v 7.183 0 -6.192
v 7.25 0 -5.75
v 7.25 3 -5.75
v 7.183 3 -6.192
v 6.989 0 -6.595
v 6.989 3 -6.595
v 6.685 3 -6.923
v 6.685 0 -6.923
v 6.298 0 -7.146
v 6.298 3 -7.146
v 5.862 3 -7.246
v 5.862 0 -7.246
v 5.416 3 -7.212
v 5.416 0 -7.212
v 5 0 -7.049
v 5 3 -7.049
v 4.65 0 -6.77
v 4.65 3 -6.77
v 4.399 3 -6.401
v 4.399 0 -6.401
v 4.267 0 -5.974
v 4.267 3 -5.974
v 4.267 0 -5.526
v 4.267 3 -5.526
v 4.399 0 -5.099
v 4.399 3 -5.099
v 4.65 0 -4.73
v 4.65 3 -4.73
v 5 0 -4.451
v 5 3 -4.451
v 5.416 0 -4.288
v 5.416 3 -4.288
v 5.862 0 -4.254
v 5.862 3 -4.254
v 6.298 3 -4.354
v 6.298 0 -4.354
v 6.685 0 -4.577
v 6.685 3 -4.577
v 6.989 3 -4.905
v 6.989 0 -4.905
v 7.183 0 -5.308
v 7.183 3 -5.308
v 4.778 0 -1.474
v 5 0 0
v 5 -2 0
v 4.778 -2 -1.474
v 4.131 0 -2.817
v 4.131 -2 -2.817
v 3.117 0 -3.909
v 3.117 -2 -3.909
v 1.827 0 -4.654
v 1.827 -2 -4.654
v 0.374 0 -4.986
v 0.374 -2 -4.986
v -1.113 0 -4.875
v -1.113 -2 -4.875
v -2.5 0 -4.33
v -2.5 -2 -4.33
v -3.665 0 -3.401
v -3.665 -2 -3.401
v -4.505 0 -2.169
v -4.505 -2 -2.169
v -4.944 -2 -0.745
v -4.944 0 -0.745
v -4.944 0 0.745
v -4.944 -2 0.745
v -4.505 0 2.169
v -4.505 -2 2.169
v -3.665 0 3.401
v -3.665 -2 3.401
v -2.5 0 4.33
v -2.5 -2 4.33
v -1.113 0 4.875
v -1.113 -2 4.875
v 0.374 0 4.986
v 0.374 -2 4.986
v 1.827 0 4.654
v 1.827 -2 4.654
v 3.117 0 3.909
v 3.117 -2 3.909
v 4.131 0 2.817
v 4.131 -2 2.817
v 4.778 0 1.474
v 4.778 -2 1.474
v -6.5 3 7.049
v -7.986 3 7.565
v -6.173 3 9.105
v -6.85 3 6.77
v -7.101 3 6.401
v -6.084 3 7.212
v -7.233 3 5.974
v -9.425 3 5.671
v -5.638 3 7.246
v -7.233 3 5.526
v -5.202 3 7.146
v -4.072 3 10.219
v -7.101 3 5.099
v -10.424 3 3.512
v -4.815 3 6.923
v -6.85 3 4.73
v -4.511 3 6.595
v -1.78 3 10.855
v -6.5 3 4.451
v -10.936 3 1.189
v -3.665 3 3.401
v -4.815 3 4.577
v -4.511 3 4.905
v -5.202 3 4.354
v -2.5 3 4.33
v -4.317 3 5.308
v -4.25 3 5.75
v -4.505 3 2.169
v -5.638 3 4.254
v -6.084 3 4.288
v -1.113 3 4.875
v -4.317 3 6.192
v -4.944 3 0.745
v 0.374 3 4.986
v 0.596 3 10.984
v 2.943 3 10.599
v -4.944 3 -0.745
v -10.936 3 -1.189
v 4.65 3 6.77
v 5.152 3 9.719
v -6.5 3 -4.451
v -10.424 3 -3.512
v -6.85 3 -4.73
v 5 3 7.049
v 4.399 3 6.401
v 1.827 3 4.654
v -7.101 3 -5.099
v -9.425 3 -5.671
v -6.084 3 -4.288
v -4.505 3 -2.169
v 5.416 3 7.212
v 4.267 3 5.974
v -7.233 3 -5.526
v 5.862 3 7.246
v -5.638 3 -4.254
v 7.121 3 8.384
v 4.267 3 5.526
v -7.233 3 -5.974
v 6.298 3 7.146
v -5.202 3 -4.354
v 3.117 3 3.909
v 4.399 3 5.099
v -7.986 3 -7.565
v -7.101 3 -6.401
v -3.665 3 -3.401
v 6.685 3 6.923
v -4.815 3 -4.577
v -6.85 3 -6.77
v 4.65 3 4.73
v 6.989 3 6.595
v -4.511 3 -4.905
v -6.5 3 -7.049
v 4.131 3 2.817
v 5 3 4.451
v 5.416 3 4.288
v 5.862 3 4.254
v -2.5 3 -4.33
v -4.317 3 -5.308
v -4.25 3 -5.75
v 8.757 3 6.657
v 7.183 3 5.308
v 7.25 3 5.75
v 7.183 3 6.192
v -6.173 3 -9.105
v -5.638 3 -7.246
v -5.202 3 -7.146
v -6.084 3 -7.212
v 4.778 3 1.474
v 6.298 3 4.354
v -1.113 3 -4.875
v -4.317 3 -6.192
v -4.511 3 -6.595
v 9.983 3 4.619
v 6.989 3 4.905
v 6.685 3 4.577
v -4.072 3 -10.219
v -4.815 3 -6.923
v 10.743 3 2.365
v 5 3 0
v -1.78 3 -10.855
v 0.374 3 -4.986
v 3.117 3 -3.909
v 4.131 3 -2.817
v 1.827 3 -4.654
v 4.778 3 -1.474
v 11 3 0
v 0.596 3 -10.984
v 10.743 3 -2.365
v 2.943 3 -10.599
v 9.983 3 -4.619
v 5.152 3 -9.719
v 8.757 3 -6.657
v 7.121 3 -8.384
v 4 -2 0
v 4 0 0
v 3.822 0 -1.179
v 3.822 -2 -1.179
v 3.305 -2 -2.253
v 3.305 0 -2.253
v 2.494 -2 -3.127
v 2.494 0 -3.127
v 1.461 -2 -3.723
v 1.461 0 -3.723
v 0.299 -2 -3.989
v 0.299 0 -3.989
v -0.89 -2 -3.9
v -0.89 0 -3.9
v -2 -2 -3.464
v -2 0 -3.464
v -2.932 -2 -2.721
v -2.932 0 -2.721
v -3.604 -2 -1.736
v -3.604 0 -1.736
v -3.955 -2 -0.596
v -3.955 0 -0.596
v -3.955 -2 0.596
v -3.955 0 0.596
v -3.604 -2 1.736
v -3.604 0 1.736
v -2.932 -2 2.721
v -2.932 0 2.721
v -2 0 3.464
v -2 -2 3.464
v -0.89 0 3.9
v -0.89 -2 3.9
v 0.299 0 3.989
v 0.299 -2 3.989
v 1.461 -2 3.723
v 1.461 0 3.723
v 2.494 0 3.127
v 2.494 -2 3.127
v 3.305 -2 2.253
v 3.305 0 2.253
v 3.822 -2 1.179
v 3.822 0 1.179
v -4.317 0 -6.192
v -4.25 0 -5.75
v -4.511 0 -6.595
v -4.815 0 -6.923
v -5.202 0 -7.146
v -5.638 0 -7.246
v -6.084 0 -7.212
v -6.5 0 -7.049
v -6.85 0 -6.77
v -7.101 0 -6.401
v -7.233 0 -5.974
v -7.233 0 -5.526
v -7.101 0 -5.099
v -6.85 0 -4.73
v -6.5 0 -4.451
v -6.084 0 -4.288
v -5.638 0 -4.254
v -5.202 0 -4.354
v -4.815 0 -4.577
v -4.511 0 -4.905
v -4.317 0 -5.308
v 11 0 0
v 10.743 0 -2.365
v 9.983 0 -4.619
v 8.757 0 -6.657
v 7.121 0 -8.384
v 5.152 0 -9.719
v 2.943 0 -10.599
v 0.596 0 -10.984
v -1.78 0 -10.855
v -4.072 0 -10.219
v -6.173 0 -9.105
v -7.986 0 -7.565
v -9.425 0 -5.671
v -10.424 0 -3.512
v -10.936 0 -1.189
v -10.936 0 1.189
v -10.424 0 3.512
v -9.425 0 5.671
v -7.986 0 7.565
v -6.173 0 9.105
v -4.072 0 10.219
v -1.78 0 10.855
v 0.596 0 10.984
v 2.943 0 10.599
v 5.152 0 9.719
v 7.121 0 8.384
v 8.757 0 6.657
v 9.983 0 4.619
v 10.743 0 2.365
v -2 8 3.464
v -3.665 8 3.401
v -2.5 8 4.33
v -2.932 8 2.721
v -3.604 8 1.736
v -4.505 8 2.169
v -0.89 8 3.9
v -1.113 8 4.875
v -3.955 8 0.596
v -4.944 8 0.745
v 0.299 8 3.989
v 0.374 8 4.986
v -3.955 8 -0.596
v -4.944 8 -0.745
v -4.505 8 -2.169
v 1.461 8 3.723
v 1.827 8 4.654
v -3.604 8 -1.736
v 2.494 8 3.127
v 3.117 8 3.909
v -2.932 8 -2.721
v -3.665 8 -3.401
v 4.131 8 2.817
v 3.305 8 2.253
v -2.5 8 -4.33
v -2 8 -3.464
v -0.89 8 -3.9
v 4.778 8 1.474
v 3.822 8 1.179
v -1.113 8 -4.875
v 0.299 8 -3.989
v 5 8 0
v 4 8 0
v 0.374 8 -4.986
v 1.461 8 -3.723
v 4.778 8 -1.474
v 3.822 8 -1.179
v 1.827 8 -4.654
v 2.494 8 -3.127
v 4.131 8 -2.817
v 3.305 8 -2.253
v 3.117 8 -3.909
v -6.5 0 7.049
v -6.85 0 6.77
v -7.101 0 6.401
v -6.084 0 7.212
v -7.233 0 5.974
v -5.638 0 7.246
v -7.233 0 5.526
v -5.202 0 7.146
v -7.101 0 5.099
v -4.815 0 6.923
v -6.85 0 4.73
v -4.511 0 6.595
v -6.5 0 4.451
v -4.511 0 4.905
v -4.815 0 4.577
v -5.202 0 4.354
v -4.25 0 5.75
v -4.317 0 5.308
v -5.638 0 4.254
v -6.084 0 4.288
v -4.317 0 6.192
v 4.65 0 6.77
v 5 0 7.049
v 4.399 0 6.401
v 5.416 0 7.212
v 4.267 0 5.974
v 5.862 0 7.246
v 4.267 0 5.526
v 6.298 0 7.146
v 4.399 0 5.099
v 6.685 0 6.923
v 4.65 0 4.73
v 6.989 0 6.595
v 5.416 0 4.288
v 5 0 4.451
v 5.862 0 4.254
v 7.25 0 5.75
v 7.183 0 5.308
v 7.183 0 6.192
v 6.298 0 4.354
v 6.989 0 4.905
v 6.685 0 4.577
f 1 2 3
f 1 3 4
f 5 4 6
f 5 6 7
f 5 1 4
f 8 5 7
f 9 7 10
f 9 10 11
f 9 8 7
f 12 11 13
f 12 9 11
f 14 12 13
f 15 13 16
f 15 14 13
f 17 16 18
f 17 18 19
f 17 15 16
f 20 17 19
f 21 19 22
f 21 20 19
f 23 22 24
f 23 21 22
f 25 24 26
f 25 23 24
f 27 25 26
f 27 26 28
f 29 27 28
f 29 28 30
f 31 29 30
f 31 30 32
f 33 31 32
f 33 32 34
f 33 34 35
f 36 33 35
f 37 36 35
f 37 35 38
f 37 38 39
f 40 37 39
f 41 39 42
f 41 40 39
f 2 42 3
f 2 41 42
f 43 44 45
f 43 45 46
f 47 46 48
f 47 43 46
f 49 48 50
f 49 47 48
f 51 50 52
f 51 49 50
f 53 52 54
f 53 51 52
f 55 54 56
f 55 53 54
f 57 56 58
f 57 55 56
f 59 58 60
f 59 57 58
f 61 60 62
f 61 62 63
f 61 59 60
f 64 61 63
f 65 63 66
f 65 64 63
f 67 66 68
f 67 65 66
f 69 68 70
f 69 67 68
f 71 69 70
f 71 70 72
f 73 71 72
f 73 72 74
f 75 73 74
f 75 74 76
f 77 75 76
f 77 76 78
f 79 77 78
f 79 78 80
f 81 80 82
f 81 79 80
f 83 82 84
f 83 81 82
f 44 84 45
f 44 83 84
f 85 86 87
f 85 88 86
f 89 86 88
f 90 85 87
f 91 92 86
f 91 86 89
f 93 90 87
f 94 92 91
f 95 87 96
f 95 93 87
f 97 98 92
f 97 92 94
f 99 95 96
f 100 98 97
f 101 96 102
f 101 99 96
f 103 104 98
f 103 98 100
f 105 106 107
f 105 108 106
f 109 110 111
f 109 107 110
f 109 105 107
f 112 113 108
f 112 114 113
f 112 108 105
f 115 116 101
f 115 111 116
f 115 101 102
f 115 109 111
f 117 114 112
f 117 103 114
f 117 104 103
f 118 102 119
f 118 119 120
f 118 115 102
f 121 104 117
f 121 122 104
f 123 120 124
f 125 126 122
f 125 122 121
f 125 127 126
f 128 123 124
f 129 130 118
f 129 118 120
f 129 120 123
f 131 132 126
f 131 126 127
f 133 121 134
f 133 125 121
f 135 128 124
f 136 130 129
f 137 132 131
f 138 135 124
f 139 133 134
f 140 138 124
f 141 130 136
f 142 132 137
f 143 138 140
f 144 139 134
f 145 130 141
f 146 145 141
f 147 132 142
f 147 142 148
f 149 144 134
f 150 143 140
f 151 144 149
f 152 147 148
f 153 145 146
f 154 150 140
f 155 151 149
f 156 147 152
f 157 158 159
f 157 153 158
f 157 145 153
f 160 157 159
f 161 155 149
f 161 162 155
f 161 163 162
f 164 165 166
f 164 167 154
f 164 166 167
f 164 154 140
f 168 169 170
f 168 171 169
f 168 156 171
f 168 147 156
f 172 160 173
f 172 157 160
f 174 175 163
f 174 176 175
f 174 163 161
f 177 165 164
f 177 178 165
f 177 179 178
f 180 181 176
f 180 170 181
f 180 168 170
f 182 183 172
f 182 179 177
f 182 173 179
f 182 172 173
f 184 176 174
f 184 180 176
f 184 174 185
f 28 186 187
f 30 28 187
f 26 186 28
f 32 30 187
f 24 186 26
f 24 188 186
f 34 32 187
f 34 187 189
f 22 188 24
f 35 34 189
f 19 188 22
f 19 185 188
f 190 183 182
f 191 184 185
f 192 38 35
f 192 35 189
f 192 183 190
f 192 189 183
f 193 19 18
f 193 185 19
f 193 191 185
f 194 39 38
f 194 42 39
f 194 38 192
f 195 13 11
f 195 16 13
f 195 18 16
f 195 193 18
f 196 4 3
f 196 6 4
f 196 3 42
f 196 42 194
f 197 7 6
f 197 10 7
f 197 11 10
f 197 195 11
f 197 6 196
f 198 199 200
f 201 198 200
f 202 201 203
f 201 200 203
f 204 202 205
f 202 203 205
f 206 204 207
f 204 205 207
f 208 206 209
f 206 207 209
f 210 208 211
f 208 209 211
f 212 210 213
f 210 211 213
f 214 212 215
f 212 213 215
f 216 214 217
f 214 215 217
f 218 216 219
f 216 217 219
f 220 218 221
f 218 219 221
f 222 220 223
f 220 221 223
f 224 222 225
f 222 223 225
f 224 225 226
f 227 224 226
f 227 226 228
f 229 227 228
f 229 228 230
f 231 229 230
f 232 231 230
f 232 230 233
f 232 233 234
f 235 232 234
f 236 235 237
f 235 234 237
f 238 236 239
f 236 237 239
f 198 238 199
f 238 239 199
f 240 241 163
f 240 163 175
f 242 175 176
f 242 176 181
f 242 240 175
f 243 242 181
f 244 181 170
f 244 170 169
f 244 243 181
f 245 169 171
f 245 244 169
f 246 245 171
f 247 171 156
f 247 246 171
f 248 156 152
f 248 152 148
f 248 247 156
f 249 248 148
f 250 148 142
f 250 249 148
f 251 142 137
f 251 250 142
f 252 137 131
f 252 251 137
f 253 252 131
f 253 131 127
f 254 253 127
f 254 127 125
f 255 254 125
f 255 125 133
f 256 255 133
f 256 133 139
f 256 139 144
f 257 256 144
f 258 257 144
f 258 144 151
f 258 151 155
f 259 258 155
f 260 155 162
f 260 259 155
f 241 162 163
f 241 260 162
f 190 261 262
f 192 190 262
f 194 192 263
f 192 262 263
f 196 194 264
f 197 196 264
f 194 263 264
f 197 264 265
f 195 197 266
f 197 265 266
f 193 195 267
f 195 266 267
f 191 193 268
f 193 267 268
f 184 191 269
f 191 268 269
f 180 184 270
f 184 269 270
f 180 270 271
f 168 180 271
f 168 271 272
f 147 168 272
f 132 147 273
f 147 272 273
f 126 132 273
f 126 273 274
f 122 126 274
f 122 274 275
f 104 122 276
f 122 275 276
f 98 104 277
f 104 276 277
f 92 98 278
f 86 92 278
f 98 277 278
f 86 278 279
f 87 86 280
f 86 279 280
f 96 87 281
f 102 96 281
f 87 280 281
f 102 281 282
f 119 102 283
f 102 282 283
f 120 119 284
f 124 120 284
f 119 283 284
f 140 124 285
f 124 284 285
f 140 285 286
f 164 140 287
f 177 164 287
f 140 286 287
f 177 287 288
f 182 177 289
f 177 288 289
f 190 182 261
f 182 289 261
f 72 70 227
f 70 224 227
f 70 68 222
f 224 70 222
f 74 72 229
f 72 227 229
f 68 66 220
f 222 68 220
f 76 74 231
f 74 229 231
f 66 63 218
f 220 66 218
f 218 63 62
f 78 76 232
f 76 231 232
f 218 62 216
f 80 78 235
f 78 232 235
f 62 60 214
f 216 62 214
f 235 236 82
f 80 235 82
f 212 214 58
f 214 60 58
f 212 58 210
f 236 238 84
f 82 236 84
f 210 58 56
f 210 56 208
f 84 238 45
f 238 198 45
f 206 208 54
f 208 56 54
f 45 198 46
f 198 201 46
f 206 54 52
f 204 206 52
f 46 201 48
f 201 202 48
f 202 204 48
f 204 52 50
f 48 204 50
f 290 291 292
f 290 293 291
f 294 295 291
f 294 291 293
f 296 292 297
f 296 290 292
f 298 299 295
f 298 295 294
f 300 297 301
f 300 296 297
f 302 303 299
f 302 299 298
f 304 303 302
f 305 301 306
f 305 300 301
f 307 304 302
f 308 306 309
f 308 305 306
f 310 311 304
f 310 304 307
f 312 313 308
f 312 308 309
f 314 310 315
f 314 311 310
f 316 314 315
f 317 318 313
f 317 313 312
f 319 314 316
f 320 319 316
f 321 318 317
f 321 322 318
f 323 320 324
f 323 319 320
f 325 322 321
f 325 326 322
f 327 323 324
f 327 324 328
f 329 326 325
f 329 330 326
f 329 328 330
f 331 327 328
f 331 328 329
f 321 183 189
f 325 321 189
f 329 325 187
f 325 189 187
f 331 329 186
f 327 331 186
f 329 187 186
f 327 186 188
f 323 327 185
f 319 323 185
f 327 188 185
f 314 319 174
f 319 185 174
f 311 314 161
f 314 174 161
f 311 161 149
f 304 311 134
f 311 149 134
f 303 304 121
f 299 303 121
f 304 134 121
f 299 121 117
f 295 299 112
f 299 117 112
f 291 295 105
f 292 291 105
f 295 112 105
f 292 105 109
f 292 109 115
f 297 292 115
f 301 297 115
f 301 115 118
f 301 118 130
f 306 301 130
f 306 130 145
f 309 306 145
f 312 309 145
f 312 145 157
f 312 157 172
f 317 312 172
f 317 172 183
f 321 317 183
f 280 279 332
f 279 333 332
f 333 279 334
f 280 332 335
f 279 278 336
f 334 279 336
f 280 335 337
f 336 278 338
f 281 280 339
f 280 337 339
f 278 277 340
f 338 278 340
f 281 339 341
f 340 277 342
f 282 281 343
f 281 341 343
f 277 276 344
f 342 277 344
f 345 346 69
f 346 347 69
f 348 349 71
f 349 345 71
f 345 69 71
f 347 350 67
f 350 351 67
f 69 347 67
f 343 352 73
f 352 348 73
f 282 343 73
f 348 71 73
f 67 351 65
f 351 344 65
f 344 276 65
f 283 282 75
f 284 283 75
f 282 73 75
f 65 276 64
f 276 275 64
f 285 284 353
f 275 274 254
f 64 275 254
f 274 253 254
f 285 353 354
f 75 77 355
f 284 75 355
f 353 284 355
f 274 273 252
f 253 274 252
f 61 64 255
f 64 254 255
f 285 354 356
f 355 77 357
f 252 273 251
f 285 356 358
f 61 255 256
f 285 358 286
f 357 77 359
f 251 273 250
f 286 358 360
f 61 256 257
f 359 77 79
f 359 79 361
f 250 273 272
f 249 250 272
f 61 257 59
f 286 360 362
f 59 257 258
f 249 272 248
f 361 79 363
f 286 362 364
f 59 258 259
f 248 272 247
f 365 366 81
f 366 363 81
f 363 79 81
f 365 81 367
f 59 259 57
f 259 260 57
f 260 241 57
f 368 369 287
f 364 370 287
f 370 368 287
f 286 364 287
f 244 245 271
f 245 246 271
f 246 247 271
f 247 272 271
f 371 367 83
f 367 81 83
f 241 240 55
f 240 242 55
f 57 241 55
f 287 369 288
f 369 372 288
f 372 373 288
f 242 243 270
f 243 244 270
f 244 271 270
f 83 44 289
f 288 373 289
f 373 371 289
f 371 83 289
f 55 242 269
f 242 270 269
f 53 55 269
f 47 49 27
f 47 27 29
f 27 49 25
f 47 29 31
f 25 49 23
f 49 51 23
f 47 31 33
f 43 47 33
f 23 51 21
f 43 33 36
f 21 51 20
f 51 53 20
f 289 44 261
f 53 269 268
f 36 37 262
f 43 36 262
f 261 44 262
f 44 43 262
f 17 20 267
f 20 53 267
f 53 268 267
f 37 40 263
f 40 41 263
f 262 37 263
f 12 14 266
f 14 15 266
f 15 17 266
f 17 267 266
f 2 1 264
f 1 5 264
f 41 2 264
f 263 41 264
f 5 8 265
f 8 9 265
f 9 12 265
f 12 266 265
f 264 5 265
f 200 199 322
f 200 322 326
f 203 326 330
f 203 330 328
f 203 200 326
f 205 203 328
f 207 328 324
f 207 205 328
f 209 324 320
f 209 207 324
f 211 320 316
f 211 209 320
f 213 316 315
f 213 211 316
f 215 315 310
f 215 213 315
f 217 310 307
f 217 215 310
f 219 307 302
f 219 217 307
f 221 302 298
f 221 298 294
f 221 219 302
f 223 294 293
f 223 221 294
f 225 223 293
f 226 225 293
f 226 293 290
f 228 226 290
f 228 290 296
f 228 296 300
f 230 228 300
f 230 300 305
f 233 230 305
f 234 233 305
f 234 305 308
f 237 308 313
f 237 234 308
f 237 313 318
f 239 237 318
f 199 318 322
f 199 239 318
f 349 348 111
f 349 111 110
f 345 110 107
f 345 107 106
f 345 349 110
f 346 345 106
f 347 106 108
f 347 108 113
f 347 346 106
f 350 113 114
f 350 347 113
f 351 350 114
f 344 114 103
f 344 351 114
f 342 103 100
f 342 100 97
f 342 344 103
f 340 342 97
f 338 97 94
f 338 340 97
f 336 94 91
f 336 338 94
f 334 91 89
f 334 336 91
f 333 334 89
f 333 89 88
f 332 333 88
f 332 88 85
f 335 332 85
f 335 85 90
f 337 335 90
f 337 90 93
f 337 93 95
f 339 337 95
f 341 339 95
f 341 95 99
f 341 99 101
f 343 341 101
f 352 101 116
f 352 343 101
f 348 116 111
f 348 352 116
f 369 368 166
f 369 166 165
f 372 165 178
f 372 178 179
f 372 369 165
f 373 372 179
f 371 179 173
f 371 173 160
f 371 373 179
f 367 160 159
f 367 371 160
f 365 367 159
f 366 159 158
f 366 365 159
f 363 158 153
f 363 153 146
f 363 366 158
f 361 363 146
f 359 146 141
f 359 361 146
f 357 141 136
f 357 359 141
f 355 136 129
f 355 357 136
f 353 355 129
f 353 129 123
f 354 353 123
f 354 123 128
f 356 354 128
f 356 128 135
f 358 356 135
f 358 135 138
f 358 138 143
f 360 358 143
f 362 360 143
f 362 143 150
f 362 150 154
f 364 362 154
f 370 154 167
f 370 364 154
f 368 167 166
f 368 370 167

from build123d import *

# Parameters (mm, degrees)
SKETCH1_R                = 11
SKETCH1_R_2              = 5
SKETCH1_R_3              = 1.5
BOSS_EXTRUDE1_DEPTH      = 3
SKETCH2_R                = 5
SKETCH2_R_2              = 4
BOSS_EXTRUDE2_DEPTH      = 8
BOSS_EXTRUDE2_DEPTH_BACK = 2


with BuildPart() as part:
    # Sketch1 → Boss-Extrude1 (new body)
    with BuildSketch(Plane(origin=(0, 0, 0), x_dir=(1, 0, 0), z_dir=(0, 1, 0))):
        Circle(SKETCH1_R)
        Circle(SKETCH1_R_2, mode=Mode.SUBTRACT)
        with Locations((-5.75, 5.75)):
            Circle(SKETCH1_R_3, mode=Mode.SUBTRACT)
        with Locations((5.75, 5.75)):
            Circle(SKETCH1_R_3, mode=Mode.SUBTRACT)
        with Locations((5.75, -5.75)):
            Circle(SKETCH1_R_3, mode=Mode.SUBTRACT)
        with Locations((-5.75, -5.75)):
            Circle(SKETCH1_R_3, mode=Mode.SUBTRACT)
    extrude(amount=BOSS_EXTRUDE1_DEPTH)

    # Sketch2 → Boss-Extrude2 (add, two sides)
    with BuildSketch(Plane(origin=(0, 0, 0), x_dir=(1, 0, 0), z_dir=(0, 1, 0))) as boss_extrude2_sk:
        Circle(SKETCH2_R)
        Circle(SKETCH2_R_2, mode=Mode.SUBTRACT)
    extrude(amount=BOSS_EXTRUDE2_DEPTH)
    extrude(boss_extrude2_sk.sketch, amount=-BOSS_EXTRUDE2_DEPTH_BACK)


solid = part.part
